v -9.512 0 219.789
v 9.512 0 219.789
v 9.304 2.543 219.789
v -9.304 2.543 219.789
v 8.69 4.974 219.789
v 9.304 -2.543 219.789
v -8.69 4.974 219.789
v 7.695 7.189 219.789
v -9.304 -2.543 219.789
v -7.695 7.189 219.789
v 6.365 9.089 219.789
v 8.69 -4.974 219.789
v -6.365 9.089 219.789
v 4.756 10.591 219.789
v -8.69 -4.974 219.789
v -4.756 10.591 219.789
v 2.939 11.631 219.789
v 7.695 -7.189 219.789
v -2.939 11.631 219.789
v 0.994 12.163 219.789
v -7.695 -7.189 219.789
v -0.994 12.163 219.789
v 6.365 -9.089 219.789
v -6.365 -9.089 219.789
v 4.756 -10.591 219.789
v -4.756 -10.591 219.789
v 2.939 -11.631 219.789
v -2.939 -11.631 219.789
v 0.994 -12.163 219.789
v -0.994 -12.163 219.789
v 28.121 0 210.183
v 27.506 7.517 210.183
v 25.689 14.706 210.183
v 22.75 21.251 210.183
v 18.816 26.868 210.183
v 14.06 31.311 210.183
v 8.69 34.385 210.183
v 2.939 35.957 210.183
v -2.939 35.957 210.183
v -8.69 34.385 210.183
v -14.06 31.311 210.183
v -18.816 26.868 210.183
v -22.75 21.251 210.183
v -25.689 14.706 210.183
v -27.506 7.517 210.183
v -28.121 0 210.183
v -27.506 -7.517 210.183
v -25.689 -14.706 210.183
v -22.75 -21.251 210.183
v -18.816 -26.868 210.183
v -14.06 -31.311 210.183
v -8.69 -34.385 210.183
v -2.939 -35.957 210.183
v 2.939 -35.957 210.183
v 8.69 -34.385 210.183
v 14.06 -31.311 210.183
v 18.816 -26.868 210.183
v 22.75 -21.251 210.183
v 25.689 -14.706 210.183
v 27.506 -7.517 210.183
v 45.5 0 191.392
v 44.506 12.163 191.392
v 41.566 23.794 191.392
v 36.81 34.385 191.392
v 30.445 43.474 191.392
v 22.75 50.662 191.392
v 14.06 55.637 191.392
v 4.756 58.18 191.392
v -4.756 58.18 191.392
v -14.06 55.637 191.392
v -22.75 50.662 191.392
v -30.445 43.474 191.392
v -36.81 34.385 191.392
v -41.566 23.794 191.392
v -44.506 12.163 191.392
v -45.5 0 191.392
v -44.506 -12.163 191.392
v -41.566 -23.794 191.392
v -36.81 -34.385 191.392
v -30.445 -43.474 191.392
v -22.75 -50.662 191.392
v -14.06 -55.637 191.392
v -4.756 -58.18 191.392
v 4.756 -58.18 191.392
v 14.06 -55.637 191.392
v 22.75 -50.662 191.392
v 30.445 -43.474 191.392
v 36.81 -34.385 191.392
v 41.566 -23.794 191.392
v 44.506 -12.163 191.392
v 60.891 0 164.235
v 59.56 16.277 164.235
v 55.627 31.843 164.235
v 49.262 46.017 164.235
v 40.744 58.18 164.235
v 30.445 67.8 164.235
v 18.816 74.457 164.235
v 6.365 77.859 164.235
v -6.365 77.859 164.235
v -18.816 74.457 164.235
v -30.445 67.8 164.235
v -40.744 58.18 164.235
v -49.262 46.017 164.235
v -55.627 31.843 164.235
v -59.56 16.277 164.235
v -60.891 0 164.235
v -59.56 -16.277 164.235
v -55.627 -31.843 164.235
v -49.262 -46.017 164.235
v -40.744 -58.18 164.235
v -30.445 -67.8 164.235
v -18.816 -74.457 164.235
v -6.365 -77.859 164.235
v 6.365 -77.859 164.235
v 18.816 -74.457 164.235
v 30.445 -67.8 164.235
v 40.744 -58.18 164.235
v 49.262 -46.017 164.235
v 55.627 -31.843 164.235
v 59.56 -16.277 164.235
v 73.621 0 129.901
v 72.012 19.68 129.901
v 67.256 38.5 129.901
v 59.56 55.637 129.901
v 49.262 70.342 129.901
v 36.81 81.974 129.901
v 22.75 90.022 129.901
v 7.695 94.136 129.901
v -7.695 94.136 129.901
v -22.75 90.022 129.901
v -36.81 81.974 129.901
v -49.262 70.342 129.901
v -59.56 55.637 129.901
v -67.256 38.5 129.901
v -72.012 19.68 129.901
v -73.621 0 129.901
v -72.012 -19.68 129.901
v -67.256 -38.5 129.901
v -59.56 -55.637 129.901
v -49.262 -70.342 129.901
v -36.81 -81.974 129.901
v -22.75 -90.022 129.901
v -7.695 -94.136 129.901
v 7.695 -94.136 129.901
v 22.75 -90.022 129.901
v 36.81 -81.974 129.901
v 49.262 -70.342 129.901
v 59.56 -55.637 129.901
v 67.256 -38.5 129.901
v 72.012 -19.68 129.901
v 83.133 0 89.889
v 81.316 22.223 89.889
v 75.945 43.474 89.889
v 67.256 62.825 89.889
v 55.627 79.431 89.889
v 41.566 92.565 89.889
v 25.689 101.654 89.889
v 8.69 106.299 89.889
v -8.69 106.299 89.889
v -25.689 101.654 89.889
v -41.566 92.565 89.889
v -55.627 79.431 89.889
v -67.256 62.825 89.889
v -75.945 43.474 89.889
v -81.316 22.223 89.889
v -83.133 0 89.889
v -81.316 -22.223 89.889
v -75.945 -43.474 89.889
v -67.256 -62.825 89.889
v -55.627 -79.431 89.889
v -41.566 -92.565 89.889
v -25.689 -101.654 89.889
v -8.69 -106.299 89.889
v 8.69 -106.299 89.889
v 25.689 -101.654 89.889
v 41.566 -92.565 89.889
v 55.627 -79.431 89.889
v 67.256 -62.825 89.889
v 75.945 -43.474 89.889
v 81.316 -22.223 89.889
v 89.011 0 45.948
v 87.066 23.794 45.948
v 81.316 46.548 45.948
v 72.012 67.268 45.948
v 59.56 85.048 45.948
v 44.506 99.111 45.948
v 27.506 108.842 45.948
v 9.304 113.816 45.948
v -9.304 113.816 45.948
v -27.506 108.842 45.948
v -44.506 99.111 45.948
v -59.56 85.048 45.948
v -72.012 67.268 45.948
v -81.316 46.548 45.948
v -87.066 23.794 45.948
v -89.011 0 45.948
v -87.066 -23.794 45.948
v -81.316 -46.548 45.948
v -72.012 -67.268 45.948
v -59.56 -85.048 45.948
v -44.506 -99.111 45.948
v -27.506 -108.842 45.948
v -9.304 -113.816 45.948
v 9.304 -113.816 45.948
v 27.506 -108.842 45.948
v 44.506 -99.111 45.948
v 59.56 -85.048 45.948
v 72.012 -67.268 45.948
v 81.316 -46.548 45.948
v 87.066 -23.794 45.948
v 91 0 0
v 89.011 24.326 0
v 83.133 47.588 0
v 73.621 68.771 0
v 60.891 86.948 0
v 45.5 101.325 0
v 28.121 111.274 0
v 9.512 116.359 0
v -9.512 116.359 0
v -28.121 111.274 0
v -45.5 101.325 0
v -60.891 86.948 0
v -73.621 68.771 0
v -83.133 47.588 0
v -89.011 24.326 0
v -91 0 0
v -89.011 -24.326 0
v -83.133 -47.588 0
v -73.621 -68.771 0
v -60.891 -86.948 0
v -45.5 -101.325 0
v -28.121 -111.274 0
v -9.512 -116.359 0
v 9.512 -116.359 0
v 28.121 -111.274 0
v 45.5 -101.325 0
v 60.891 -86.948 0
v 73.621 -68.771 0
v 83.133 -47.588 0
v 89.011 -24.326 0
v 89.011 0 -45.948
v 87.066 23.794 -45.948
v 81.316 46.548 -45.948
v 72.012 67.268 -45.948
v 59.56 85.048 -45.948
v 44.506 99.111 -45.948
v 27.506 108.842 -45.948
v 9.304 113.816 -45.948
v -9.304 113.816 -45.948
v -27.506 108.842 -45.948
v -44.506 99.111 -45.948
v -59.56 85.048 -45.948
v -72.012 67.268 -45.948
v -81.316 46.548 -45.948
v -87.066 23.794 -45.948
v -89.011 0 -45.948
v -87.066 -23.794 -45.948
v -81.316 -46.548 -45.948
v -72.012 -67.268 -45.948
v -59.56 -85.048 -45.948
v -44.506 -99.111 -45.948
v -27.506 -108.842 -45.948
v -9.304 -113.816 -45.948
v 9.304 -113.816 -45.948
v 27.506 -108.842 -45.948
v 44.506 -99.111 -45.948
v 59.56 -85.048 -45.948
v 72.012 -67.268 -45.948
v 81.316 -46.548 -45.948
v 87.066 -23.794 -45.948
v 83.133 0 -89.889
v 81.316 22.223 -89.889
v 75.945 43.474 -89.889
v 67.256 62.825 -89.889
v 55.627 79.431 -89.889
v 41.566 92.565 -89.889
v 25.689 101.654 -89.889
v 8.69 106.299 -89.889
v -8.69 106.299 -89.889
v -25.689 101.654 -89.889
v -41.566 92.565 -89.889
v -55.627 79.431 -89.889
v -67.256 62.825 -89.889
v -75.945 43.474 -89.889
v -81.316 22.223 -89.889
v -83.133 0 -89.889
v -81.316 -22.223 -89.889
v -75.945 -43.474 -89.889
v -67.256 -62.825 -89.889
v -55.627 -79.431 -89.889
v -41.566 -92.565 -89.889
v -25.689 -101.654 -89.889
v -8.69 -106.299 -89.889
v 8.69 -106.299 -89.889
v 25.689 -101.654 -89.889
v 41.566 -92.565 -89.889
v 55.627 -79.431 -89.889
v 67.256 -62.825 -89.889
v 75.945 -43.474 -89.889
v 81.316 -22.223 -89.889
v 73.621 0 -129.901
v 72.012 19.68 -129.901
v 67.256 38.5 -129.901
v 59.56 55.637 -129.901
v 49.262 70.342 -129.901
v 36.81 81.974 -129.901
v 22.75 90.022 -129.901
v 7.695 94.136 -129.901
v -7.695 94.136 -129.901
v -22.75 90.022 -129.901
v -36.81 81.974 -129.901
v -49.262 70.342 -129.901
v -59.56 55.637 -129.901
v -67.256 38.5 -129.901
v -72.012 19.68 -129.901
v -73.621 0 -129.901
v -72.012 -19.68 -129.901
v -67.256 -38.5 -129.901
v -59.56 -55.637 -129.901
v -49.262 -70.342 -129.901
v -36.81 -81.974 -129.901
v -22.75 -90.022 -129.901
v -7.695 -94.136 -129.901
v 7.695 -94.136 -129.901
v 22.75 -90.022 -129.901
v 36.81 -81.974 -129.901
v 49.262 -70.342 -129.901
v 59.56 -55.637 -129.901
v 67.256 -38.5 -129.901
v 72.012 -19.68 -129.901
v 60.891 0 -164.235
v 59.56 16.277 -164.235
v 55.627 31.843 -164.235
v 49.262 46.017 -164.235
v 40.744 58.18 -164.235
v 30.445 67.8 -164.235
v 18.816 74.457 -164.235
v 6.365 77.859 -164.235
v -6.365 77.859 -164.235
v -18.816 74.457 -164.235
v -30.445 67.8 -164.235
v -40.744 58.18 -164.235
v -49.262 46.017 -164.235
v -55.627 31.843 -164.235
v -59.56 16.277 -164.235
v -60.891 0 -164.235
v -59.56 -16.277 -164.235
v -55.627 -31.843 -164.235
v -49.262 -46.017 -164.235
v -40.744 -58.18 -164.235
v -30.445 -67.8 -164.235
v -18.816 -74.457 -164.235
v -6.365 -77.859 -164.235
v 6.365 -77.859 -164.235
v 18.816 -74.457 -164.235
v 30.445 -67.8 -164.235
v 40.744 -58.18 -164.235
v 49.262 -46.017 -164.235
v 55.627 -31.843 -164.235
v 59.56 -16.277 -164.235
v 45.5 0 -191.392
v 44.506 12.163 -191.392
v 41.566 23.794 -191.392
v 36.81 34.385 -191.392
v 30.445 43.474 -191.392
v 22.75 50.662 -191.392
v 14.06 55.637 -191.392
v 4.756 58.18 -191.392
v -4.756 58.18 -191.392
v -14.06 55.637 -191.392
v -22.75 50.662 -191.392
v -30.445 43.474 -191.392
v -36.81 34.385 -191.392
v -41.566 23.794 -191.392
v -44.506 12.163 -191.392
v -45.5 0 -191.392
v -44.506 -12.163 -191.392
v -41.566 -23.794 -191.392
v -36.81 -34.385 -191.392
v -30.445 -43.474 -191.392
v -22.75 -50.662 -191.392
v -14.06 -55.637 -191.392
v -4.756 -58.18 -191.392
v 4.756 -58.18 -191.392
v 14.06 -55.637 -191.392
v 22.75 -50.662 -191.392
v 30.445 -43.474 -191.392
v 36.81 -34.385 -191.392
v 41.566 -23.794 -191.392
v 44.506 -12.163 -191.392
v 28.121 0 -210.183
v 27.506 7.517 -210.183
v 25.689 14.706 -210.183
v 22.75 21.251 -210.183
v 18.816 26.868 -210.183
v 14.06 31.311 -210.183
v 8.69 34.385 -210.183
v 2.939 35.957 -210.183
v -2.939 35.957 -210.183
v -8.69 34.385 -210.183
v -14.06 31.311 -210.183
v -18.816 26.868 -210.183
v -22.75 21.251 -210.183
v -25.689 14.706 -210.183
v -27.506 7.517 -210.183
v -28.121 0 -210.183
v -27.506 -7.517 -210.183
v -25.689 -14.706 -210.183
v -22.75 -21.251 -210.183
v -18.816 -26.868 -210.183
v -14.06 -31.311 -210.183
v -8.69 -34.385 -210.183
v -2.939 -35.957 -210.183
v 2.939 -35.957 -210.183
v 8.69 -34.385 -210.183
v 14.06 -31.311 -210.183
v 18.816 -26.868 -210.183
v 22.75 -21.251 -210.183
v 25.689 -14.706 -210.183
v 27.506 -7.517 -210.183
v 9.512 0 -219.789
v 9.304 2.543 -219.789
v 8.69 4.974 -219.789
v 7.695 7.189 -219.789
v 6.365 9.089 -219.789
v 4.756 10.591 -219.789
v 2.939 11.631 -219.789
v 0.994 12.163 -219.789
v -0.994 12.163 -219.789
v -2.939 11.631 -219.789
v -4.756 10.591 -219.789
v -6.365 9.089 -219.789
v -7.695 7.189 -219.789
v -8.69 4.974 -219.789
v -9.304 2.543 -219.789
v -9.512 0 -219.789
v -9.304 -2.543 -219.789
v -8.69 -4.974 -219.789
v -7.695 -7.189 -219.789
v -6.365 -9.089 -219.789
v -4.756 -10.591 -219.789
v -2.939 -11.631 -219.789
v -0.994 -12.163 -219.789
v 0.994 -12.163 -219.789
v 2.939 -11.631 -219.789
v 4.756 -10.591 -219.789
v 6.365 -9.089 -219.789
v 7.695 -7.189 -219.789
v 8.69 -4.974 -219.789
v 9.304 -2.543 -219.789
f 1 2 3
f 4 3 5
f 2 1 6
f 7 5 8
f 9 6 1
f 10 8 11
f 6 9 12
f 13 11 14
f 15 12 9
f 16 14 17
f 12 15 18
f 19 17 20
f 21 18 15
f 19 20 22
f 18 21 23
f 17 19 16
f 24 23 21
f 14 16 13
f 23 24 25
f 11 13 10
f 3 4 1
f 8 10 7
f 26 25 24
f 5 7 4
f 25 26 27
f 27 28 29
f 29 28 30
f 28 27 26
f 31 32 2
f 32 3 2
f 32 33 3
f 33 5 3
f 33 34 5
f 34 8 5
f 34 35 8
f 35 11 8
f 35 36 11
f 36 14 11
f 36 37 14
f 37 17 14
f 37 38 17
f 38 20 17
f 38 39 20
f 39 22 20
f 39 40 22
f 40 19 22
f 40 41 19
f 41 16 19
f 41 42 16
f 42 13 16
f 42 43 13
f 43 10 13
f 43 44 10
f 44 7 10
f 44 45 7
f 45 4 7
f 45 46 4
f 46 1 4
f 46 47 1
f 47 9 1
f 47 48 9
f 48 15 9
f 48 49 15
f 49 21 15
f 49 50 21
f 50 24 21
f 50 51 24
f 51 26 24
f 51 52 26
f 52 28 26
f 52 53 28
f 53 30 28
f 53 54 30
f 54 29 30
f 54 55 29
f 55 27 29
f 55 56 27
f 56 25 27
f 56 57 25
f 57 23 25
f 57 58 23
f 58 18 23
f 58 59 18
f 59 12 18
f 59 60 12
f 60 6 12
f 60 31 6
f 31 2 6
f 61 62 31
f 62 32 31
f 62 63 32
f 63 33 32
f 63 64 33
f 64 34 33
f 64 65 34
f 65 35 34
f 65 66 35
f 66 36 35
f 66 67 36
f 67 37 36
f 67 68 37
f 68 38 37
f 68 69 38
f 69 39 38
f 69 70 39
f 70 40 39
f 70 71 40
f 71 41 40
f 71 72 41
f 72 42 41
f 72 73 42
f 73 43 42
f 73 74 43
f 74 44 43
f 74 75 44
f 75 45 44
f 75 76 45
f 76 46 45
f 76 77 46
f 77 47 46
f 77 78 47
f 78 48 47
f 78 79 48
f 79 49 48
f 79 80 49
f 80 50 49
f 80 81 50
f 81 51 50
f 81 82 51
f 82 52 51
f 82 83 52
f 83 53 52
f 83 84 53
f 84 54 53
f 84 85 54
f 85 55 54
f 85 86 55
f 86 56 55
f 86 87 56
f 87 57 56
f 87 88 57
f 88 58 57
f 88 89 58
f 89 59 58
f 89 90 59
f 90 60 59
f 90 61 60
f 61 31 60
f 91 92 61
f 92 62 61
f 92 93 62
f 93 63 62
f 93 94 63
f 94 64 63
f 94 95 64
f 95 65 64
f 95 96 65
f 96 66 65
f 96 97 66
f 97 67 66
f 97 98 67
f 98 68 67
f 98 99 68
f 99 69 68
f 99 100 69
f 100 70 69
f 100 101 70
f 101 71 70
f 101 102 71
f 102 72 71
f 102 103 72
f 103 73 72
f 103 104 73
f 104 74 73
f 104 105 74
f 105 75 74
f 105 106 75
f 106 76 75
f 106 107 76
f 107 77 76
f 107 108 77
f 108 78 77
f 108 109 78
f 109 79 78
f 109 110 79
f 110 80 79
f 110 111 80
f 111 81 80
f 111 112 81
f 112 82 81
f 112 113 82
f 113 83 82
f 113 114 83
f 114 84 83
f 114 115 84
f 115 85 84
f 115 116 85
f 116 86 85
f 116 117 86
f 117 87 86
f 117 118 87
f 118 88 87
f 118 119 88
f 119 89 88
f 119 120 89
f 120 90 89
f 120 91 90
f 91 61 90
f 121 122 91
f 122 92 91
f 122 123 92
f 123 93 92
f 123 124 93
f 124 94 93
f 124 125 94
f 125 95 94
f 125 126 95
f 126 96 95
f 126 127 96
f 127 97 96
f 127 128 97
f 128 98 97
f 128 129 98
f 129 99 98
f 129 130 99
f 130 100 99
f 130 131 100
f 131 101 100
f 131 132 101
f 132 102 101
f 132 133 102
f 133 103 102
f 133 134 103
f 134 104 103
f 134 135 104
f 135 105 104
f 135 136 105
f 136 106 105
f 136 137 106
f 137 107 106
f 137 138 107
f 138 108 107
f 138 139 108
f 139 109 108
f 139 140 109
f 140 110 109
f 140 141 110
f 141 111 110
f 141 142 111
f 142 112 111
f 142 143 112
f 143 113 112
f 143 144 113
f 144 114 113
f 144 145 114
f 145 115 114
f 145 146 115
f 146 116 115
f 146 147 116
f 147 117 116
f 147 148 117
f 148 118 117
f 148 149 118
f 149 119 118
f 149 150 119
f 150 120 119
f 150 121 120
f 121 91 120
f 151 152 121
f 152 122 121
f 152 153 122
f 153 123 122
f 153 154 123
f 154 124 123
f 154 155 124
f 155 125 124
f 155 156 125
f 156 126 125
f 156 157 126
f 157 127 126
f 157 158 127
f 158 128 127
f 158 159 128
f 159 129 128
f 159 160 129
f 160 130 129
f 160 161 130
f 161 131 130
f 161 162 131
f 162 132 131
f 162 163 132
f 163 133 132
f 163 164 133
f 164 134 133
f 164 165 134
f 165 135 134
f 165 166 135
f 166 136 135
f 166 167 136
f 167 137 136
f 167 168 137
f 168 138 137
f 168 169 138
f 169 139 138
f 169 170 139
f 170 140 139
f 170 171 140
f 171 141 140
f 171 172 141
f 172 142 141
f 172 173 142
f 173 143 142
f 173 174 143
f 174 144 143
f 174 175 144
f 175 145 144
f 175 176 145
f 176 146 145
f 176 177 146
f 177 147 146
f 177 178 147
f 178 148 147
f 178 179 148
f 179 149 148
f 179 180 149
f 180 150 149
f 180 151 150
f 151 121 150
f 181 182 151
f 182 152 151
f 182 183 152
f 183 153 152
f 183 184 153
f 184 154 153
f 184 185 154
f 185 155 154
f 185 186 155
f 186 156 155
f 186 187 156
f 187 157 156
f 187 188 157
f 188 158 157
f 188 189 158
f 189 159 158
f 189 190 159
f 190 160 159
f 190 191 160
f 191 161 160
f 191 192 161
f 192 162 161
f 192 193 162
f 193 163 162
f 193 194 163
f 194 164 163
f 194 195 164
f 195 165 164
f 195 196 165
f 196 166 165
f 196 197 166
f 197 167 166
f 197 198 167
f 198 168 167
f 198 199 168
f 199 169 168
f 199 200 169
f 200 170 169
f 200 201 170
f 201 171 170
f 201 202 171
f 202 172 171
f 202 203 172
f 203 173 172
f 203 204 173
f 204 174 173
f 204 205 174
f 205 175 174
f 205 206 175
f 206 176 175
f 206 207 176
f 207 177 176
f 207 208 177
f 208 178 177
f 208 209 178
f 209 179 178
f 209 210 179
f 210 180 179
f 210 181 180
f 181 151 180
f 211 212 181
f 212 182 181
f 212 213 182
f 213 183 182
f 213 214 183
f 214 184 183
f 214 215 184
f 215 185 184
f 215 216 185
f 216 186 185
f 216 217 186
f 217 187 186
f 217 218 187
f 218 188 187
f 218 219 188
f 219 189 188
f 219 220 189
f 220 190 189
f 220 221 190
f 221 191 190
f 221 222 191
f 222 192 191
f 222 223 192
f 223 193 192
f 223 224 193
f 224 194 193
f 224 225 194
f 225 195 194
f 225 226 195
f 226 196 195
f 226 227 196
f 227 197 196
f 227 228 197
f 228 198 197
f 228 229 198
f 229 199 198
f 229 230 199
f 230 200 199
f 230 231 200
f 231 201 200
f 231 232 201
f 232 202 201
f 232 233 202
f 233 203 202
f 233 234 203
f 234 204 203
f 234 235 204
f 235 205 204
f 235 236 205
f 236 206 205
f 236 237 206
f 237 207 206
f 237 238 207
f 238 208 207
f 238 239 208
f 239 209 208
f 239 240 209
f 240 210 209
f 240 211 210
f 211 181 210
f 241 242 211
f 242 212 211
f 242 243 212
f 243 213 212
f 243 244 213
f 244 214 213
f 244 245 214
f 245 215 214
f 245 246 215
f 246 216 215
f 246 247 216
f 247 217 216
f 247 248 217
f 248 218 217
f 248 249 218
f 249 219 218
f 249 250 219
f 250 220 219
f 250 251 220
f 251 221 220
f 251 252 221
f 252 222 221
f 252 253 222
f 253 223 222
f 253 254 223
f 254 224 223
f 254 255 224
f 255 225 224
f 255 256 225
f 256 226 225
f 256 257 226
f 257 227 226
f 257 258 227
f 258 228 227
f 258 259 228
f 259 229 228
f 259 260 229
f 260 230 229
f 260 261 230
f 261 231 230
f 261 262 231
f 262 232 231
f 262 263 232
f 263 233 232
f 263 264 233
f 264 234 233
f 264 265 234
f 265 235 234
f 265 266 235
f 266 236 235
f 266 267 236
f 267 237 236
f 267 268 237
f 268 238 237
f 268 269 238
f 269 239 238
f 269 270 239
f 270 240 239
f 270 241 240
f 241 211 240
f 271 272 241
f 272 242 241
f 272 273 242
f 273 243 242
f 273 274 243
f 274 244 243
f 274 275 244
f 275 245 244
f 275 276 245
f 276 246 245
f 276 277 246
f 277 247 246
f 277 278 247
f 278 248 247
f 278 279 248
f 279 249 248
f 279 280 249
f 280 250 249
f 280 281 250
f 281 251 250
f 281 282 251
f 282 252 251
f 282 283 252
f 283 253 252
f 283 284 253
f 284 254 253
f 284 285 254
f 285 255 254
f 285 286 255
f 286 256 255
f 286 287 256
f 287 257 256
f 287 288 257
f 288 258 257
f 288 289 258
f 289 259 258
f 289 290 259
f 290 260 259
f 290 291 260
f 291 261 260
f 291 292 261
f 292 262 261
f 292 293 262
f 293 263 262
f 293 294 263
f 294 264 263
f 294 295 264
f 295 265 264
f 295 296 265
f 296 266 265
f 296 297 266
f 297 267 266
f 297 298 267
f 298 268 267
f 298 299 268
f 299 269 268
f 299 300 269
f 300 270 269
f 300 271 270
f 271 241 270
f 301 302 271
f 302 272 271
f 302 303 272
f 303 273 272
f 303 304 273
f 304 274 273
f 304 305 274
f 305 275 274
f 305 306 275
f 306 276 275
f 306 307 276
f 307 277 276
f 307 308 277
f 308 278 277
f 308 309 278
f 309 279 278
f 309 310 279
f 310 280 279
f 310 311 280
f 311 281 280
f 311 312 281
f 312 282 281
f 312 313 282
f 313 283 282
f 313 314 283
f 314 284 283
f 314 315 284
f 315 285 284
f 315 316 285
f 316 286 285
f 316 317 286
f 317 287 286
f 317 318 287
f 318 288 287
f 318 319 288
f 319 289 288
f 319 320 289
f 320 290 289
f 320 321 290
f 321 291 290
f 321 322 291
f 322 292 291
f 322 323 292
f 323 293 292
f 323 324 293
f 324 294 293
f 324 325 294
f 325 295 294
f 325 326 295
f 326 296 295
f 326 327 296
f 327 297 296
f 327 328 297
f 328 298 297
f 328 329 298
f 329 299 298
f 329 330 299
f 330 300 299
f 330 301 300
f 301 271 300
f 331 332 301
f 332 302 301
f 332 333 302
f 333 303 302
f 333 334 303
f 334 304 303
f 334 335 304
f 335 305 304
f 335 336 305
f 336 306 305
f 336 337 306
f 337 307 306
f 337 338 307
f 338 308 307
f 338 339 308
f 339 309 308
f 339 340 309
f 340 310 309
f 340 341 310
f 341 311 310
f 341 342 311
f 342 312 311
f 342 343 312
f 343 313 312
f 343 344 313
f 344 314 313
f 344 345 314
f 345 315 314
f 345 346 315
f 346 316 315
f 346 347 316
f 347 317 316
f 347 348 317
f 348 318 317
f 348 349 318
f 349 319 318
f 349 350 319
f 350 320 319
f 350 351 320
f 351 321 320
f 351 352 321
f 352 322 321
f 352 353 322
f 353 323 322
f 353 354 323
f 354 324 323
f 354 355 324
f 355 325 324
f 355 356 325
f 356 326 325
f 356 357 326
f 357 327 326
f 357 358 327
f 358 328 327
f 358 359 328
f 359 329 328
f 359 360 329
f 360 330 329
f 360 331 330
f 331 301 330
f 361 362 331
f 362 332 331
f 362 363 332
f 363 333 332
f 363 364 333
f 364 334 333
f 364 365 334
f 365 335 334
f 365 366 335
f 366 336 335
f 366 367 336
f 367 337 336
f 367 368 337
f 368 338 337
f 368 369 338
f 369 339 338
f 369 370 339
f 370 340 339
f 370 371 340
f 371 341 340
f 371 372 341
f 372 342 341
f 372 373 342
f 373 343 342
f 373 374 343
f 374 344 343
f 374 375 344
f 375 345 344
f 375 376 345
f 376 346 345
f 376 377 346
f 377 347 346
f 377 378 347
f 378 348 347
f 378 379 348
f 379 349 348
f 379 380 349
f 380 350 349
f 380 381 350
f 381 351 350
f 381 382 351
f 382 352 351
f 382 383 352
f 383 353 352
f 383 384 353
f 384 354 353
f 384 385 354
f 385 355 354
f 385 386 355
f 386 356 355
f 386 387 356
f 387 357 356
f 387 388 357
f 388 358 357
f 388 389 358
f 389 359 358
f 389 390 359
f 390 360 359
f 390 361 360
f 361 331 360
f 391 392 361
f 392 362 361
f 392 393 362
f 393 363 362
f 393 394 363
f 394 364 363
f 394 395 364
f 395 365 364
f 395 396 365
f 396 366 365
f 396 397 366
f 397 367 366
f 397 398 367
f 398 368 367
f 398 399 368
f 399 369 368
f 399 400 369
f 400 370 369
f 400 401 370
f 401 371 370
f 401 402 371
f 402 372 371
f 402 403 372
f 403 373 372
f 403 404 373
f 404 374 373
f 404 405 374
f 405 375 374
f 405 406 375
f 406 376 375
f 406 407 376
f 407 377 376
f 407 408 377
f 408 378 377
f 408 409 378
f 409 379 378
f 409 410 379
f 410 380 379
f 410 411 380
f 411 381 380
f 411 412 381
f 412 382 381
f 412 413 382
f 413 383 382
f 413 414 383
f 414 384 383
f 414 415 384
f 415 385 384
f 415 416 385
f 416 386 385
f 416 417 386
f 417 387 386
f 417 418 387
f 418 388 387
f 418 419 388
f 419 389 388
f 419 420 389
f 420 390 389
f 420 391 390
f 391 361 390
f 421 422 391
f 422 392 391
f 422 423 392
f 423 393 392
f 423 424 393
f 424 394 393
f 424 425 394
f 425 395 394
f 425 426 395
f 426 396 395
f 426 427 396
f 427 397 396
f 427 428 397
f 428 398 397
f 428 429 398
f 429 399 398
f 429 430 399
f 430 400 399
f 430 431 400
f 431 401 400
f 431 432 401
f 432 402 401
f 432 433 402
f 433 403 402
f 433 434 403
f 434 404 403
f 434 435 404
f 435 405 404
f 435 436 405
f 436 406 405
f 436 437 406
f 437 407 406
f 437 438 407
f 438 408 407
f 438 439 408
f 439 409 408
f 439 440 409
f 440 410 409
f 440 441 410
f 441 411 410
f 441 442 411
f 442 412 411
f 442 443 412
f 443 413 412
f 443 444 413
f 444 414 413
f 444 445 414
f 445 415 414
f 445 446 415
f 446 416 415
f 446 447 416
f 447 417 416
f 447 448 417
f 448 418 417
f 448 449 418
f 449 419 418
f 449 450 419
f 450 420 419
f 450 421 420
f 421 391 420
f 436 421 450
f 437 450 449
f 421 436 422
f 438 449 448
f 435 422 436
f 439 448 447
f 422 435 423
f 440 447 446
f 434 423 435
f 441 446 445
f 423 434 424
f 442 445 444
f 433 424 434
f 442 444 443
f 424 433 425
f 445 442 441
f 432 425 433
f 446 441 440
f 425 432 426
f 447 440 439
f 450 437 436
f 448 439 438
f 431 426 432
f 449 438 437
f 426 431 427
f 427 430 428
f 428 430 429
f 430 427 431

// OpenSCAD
// Generated by SolidPython 1.0.1 on 2020-07-29 00:46:47


scale(v = [7, 9, 17]) {
	sphere(r = 13);
}
/***********************************************
*********      SolidPython code:      **********
************************************************
 
# import packages: SolidPython
from solid import *
from solid.utils import *
from itertools import chain, combinations, permutations


class Resize:

    def __init__(self, scad_file):
        self.scad_file = scad_file
        #self.scad_file = import_scad(scad_file)
        # cone/cylinder param:
        self.r1 = 0
        self.r2 = 0
        self.h = 0
        # rectangular prism param:
        self.w = 0
        self.l = 0
        # ellipse param:
        self.r = 0

    # import OpenScad code (file name corresponds to shape)


    # classify shape + parameters
    def assign(self, param1, param2, param3):
        if self.scad_file == 'cone.scad':
            self.r1 = param1
            self.r2 = param2
            self.h = param3
        elif self.scad_file == 'cylinder.scad':
            self.r1 = param1
            self.r2 = param2
            self.h = param3
        elif self.scad_file == 'rectangularPrism.scad':
            self.h = param1
            self.l = param2
            self.w = param3
        else:
            self.r = param1
            self.h = param2

    # resize parameters
    def iterate(self):
        x = range(3, 20, 2)
        i = 1
        if self.scad_file == 'cone.scad':
            tempList = list(permutations(x, 2))
            for temp in tempList:
                param1 = temp[0]
                param2 = temp[1]
                filepath = 'produced_scad_files/' + 'cone' + str(param1) + '_' + str(param2) + '_' + '.scad'
                scad_render_to_file(cylinder(h=param1, r1=param2, r2=0), filepath)

        elif self.scad_file == 'cylinder.scad':
            tempList = list(permutations(x, 3))
            for temp in tempList:
                param1 = temp[0]
                param2 = temp[1]
                filepath = 'produced_scad_files/' + 'cylinder' + str(param1) + '_' + str(param2) + '_' + '.scad'
                scad_render_to_file(cylinder(h=param1, r1=param2, r2=param2), filepath)

        elif self.scad_file == 'rectangularPrism.scad':
            tempList = list(permutations(x, 3))
            for temp in tempList:
                param1 = temp[0]
                param2 = temp[1]
                param3 = temp[2]
                filepath = 'produced_scad_files/' + 'rectangularPrism' + str(param1) + '_' + str(param2) + '_' + str(
                    param3) + '.scad'
                scad_render_to_file(cube(size=(param1, param2, param3)), filepath)

        elif self.scad_file == 'ellipse.scad':
            tempList = list(permutations(x, 4))
            for temp in tempList:
                param1 = temp[0]
                param2 = temp[1]
                param3 = temp[2]
                param4 = temp[3]
                filepath = 'produced_scad_files/' + 'ellipse' + str(param1) + '_' + str(param2) + '_' + str(param3) + '_' + str(param4) + '.scad'
                scad_render_to_file(scale([param1, param2, param3])(sphere(r=param4)), filepath)

    def render_to_scadfile(self):
        scad_render_to_file(scad, 'example.scad') 
 
************************************************/
